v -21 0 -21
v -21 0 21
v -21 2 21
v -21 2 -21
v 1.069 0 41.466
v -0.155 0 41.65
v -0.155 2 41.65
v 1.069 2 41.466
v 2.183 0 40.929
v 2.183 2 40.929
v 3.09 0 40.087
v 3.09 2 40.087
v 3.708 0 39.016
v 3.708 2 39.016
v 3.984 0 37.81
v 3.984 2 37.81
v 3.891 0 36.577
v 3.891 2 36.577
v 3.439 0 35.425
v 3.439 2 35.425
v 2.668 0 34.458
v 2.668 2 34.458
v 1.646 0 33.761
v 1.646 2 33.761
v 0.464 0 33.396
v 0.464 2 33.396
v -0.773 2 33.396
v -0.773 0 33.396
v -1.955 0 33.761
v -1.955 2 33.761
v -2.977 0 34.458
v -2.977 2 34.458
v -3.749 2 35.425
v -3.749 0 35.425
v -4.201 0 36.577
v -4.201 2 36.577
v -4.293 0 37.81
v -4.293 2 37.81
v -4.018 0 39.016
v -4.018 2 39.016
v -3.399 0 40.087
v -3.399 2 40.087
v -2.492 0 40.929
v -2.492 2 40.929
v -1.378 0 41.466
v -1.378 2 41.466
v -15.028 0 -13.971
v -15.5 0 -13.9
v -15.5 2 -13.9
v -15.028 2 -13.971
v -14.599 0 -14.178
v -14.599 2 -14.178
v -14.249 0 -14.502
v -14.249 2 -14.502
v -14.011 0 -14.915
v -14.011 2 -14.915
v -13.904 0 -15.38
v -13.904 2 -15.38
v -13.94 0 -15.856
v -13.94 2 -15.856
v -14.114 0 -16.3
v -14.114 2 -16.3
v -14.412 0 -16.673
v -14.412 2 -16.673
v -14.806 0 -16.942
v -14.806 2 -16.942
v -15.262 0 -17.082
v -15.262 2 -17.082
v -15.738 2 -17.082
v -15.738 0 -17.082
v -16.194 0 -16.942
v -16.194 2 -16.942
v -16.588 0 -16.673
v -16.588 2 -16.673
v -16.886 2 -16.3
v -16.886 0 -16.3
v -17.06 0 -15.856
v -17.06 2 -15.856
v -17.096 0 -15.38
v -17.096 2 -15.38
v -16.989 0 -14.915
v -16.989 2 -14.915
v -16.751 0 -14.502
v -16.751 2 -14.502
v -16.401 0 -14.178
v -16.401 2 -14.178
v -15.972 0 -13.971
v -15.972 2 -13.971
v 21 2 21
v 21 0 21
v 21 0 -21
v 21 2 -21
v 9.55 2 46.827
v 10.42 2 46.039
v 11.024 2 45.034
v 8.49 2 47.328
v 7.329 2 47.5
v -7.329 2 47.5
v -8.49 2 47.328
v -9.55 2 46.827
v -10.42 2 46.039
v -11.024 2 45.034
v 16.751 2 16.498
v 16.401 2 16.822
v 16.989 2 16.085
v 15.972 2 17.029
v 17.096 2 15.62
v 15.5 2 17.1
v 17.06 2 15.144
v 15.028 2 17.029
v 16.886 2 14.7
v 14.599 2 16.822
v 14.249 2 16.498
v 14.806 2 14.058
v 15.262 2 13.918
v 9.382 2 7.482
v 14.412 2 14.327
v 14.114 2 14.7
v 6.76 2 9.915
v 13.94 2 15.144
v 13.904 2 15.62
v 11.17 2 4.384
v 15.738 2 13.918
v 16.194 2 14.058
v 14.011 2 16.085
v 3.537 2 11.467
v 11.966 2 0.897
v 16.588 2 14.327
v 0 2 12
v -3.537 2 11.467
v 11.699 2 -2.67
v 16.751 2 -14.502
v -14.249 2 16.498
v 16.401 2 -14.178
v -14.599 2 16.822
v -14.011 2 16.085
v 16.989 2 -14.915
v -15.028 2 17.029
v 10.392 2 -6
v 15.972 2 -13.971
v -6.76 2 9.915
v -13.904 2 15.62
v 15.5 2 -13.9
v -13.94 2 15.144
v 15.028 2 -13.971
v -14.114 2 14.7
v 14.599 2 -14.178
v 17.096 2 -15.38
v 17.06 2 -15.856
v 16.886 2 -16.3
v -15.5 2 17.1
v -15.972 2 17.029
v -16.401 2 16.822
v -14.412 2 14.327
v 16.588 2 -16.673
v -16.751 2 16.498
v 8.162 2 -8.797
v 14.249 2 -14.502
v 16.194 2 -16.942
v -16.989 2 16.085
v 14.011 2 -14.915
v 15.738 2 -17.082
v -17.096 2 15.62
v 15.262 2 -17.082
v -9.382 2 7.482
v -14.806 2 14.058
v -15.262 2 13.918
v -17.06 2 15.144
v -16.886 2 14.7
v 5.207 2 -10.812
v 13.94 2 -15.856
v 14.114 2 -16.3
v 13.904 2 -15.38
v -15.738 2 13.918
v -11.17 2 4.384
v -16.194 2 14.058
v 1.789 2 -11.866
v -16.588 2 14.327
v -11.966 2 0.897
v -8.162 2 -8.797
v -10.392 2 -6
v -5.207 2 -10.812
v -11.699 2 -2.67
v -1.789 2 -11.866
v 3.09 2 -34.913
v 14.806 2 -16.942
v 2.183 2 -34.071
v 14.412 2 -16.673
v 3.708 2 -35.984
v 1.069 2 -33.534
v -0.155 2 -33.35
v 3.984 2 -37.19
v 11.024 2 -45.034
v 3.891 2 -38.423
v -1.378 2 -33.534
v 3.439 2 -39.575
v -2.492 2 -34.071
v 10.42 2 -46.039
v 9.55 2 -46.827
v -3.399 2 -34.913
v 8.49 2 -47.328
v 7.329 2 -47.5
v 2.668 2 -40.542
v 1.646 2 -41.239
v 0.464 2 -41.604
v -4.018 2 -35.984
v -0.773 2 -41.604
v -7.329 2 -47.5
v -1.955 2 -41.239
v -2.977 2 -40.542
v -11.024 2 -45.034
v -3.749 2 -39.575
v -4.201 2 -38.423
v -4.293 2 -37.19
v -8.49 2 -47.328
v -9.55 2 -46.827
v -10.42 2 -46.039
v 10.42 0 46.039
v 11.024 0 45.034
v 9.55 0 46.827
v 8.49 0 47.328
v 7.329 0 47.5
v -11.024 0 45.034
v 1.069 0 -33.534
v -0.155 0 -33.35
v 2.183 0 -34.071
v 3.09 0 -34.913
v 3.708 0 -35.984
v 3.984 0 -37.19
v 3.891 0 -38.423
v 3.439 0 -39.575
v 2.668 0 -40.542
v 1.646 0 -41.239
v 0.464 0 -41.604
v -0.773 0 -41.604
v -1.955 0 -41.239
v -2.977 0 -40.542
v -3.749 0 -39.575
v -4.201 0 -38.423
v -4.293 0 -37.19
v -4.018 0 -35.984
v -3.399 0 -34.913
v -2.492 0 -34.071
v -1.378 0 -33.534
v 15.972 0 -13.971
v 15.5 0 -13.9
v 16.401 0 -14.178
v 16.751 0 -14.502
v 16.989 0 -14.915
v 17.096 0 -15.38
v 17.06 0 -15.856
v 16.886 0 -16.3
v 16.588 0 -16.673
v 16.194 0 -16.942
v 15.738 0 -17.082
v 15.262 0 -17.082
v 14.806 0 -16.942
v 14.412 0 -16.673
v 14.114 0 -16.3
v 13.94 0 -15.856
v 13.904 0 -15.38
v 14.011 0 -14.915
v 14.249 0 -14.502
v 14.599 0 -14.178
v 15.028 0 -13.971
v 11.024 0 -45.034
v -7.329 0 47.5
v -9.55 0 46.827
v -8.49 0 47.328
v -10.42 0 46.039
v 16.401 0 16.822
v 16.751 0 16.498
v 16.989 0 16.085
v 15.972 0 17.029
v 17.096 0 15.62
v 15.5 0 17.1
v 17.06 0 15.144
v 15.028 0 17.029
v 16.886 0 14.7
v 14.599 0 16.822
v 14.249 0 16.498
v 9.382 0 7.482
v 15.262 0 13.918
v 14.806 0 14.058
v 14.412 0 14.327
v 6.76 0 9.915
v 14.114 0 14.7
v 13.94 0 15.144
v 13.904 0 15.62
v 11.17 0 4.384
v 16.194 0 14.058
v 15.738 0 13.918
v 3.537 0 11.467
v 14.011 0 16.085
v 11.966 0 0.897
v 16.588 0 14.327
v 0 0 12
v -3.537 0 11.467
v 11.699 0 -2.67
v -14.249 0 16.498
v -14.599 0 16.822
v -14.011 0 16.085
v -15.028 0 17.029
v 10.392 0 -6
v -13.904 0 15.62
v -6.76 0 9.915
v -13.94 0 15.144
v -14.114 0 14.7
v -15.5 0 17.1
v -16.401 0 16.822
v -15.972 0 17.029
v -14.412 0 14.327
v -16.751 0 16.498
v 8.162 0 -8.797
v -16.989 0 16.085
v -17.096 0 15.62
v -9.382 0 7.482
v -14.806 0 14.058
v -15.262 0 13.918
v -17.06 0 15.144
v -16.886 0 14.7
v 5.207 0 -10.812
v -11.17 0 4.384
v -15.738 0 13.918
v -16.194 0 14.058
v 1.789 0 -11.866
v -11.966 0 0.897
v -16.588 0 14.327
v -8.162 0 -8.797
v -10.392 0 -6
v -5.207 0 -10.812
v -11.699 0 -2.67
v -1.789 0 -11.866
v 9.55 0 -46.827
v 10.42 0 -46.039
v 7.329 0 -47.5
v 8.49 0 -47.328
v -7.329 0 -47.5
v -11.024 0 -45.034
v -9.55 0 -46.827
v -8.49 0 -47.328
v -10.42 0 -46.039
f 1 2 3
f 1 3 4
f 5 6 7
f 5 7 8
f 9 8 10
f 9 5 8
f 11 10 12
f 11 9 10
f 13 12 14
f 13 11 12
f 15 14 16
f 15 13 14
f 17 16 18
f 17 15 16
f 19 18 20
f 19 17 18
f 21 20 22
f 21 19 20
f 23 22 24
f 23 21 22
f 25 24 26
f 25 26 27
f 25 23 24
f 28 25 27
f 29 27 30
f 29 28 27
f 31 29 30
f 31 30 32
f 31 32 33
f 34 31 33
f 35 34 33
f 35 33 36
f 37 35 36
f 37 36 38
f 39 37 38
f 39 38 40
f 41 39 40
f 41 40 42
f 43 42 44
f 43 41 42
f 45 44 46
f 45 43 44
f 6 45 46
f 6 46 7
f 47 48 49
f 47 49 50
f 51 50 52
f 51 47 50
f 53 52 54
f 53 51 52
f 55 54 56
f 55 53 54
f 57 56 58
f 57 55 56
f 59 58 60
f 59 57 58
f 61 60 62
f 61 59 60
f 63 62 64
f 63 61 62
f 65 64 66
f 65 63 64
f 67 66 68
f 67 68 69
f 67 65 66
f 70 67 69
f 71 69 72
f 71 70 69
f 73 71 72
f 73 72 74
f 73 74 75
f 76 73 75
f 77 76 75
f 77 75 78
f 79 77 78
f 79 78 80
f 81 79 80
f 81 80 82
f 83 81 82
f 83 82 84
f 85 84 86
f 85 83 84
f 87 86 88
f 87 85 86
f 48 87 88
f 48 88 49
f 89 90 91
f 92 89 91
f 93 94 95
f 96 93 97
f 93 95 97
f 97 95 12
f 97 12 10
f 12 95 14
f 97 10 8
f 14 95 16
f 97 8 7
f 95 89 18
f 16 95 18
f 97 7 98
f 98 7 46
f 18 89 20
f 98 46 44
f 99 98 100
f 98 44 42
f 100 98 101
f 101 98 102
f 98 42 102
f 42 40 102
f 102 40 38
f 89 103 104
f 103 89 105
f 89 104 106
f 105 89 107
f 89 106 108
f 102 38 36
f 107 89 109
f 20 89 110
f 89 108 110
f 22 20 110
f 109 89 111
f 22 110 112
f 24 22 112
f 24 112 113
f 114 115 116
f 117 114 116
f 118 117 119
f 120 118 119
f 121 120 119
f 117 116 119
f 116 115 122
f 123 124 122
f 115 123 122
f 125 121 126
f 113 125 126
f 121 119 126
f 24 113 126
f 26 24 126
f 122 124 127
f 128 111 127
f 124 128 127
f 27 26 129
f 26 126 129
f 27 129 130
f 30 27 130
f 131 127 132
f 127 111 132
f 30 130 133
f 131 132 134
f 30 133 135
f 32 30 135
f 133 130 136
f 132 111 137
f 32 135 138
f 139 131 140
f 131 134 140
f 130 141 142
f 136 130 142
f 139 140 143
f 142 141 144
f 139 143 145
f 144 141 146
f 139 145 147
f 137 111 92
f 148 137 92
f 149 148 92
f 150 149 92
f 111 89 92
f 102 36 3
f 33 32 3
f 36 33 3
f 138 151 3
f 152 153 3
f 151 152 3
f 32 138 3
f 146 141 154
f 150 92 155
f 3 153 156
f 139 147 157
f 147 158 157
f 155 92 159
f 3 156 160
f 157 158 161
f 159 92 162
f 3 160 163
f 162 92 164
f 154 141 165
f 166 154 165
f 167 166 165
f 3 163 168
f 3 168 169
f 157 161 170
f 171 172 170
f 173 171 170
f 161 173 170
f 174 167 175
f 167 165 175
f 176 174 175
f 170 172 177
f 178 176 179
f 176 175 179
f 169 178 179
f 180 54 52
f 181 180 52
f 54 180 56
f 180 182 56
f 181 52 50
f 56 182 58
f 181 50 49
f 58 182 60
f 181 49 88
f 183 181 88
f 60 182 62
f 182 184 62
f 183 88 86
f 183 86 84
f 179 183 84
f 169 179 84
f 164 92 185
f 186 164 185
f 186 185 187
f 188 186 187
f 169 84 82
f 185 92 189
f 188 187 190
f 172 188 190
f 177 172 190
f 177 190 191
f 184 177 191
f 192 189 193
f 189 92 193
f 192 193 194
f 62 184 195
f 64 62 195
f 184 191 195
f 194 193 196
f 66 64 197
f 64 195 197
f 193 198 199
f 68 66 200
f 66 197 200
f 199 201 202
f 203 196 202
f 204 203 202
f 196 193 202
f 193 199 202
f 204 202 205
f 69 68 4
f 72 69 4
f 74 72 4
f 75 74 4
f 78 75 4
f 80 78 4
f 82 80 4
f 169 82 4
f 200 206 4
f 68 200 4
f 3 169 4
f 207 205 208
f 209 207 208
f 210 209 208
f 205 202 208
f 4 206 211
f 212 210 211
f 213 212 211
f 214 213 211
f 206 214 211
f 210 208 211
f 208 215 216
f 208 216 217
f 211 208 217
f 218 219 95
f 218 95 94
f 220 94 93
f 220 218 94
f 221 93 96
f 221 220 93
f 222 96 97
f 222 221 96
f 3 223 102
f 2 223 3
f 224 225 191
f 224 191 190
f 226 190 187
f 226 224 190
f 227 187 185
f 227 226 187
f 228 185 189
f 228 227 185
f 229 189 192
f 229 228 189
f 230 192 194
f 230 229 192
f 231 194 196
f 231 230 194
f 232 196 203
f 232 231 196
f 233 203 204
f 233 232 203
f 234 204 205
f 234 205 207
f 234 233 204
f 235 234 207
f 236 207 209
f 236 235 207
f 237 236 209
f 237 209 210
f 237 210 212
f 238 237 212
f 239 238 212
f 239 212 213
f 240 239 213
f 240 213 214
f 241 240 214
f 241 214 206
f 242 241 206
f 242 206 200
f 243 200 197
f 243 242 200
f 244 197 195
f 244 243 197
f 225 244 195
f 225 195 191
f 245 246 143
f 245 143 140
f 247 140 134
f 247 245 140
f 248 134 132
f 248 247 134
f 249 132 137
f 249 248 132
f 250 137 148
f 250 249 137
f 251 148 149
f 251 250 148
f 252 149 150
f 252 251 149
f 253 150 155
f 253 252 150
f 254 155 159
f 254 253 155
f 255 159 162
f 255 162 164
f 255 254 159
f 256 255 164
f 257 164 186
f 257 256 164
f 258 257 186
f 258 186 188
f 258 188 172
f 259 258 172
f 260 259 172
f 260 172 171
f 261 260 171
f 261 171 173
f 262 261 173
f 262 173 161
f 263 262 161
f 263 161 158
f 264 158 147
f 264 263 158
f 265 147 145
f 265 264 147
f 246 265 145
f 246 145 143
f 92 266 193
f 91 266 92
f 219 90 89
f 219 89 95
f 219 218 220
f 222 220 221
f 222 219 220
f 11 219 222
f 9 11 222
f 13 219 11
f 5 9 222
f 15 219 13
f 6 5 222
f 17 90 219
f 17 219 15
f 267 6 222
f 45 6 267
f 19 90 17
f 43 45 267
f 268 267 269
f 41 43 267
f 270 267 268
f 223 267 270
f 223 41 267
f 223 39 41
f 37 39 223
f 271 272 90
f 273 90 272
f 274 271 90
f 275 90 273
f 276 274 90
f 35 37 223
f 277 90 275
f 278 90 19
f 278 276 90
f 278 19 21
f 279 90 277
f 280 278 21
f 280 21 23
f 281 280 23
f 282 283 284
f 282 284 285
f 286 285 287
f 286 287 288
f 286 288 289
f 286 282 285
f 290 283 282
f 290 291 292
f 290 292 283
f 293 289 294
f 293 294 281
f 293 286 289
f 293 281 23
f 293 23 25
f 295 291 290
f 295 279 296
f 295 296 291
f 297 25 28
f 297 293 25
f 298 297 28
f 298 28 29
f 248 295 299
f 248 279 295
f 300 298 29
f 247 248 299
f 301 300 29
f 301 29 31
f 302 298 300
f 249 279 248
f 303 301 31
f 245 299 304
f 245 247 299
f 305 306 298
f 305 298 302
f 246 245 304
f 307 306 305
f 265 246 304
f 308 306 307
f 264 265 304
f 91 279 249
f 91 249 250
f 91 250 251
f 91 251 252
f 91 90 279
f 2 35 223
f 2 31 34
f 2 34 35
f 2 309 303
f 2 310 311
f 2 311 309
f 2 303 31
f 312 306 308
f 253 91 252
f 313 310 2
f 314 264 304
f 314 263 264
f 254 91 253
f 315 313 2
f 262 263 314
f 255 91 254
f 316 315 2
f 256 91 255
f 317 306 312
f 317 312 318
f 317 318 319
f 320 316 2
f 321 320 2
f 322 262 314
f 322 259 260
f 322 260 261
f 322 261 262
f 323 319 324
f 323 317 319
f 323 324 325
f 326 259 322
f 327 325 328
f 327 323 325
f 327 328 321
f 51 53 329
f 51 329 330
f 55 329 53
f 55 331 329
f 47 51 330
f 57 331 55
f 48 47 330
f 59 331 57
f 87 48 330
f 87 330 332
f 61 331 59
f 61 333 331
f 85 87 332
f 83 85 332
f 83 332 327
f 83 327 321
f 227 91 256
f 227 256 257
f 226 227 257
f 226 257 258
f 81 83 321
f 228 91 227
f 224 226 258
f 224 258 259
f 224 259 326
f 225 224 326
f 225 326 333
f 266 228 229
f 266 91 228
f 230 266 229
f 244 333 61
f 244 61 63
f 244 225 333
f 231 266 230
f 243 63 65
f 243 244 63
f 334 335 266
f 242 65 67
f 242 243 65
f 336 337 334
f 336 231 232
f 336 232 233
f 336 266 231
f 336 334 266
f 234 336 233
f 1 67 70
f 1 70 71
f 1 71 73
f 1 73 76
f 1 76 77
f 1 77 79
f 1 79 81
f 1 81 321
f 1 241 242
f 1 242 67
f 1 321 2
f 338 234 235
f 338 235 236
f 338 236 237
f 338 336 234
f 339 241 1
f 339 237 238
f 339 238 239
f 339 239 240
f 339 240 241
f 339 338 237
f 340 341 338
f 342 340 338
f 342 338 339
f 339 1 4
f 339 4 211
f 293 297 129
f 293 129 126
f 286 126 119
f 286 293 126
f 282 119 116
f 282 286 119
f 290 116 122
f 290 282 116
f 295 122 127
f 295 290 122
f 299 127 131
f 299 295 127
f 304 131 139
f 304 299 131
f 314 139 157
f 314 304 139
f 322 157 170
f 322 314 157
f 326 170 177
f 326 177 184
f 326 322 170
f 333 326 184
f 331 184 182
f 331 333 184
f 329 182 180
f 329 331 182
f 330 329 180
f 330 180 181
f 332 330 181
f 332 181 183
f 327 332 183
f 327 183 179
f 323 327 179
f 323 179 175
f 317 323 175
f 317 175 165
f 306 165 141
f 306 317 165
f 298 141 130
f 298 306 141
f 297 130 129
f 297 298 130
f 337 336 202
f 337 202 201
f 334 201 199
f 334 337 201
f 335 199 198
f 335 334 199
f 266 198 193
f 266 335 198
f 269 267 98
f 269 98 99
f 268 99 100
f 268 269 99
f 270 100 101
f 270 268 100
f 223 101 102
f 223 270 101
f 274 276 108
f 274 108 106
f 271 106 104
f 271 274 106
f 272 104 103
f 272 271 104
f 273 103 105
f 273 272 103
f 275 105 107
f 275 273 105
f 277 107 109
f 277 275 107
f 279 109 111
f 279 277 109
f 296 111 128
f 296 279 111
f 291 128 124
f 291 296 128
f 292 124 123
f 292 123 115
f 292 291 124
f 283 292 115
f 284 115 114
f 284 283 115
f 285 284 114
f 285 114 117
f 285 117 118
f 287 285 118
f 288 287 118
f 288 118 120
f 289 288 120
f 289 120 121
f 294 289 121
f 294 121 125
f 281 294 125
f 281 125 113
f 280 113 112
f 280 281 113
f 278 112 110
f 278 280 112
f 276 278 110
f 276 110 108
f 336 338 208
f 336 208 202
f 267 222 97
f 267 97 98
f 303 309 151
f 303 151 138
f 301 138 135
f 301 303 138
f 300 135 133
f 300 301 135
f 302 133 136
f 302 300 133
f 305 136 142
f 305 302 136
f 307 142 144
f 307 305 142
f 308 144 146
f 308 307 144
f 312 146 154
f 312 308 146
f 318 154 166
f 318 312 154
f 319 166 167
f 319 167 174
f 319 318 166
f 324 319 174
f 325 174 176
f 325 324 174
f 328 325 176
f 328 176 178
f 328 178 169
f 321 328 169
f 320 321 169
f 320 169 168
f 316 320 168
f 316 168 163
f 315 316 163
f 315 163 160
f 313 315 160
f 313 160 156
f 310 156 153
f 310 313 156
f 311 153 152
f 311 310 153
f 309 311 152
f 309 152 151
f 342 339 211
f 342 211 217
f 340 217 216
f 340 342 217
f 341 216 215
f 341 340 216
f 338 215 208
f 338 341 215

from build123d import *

# Parameters (mm, degrees)
SKETCH1_R           = 4.15
SKETCH1_W           = 42
SKETCH1_H           = 42
SKETCH1_R_2         = 1.6
SKETCH1_R_3         = 12
BOSS_EXTRUDE1_DEPTH = 2


with BuildPart() as part:
    # Sketch1 → Boss-Extrude1 (new body)
    # profile 1 of 3: a face of its own
    with BuildSketch(Plane(origin=(0, 0, 0), x_dir=(1, 0, 0), z_dir=(0, 1, 0))):
        with BuildLine():
            ThreePointArc((11.023825753, -45.033510687), (9.550490082, -46.826713299), (7.329459099, -47.5))
            Line((7.329459099, -47.5), (-7.329459099, -47.5))
            ThreePointArc((-7.329459099, -47.5), (-9.550490082, -46.826713299), (-11.023825753, -45.033510687))
            Line((-11.023825753, -45.033510687), (-21, -21))
            Line((-21, -21), (21, -21))
            Line((21, -21), (11.023825753, -45.033510687))
        make_face()
        with Locations(Location((-0.154657952, -37.5, 0), (0, 0, 270))):
            Circle(SKETCH1_R, mode=Mode.SUBTRACT)
    # profile 2 of 3: a face of its own
    with BuildSketch(Plane(origin=(0, 0, 0), x_dir=(1, 0, 0), z_dir=(0, 1, 0))):
        Rectangle(SKETCH1_W, SKETCH1_H)
        with Locations(Location((15.5, 15.5, 0), (0, 0, 270))):
            Circle(SKETCH1_R_2, mode=Mode.SUBTRACT)
        with Locations(Location((-15.5, 15.5, 0), (0, 0, 270))):
            Circle(SKETCH1_R_2, mode=Mode.SUBTRACT)
        with Locations(Location((0, 0, 0), (0, 0, 270))):
            Circle(SKETCH1_R_3, mode=Mode.SUBTRACT)
        with Locations(Location((15.5, -15.5, 0), (0, 0, 270))):
            Circle(SKETCH1_R_2, mode=Mode.SUBTRACT)
        with Locations(Location((-15.5, -15.5, 0), (0, 0, 270))):
            Circle(SKETCH1_R_2, mode=Mode.SUBTRACT)
    # profile 3 of 3: a face of its own
    with BuildSketch(Plane(origin=(0, 0, 0), x_dir=(1, 0, 0), z_dir=(0, 1, 0))):
        with BuildLine():
            ThreePointArc((-11.023825753, 45.033510687), (-9.550490082, 46.826713299), (-7.329459099, 47.5))
            Line((-7.329459099, 47.5), (7.329459099, 47.5))
            ThreePointArc((7.329459099, 47.5), (9.550490082, 46.826713299), (11.023825753, 45.033510687))
            Line((11.023825753, 45.033510687), (21, 21))
            Line((21, 21), (-21, 21))
            Line((-21, 21), (-11.023825753, 45.033510687))
        make_face()
        with Locations(Location((-0.154657952, 37.5, 0), (0, 0, 270))):
            Circle(SKETCH1_R, mode=Mode.SUBTRACT)
    extrude(amount=BOSS_EXTRUDE1_DEPTH)


solid = part.part
